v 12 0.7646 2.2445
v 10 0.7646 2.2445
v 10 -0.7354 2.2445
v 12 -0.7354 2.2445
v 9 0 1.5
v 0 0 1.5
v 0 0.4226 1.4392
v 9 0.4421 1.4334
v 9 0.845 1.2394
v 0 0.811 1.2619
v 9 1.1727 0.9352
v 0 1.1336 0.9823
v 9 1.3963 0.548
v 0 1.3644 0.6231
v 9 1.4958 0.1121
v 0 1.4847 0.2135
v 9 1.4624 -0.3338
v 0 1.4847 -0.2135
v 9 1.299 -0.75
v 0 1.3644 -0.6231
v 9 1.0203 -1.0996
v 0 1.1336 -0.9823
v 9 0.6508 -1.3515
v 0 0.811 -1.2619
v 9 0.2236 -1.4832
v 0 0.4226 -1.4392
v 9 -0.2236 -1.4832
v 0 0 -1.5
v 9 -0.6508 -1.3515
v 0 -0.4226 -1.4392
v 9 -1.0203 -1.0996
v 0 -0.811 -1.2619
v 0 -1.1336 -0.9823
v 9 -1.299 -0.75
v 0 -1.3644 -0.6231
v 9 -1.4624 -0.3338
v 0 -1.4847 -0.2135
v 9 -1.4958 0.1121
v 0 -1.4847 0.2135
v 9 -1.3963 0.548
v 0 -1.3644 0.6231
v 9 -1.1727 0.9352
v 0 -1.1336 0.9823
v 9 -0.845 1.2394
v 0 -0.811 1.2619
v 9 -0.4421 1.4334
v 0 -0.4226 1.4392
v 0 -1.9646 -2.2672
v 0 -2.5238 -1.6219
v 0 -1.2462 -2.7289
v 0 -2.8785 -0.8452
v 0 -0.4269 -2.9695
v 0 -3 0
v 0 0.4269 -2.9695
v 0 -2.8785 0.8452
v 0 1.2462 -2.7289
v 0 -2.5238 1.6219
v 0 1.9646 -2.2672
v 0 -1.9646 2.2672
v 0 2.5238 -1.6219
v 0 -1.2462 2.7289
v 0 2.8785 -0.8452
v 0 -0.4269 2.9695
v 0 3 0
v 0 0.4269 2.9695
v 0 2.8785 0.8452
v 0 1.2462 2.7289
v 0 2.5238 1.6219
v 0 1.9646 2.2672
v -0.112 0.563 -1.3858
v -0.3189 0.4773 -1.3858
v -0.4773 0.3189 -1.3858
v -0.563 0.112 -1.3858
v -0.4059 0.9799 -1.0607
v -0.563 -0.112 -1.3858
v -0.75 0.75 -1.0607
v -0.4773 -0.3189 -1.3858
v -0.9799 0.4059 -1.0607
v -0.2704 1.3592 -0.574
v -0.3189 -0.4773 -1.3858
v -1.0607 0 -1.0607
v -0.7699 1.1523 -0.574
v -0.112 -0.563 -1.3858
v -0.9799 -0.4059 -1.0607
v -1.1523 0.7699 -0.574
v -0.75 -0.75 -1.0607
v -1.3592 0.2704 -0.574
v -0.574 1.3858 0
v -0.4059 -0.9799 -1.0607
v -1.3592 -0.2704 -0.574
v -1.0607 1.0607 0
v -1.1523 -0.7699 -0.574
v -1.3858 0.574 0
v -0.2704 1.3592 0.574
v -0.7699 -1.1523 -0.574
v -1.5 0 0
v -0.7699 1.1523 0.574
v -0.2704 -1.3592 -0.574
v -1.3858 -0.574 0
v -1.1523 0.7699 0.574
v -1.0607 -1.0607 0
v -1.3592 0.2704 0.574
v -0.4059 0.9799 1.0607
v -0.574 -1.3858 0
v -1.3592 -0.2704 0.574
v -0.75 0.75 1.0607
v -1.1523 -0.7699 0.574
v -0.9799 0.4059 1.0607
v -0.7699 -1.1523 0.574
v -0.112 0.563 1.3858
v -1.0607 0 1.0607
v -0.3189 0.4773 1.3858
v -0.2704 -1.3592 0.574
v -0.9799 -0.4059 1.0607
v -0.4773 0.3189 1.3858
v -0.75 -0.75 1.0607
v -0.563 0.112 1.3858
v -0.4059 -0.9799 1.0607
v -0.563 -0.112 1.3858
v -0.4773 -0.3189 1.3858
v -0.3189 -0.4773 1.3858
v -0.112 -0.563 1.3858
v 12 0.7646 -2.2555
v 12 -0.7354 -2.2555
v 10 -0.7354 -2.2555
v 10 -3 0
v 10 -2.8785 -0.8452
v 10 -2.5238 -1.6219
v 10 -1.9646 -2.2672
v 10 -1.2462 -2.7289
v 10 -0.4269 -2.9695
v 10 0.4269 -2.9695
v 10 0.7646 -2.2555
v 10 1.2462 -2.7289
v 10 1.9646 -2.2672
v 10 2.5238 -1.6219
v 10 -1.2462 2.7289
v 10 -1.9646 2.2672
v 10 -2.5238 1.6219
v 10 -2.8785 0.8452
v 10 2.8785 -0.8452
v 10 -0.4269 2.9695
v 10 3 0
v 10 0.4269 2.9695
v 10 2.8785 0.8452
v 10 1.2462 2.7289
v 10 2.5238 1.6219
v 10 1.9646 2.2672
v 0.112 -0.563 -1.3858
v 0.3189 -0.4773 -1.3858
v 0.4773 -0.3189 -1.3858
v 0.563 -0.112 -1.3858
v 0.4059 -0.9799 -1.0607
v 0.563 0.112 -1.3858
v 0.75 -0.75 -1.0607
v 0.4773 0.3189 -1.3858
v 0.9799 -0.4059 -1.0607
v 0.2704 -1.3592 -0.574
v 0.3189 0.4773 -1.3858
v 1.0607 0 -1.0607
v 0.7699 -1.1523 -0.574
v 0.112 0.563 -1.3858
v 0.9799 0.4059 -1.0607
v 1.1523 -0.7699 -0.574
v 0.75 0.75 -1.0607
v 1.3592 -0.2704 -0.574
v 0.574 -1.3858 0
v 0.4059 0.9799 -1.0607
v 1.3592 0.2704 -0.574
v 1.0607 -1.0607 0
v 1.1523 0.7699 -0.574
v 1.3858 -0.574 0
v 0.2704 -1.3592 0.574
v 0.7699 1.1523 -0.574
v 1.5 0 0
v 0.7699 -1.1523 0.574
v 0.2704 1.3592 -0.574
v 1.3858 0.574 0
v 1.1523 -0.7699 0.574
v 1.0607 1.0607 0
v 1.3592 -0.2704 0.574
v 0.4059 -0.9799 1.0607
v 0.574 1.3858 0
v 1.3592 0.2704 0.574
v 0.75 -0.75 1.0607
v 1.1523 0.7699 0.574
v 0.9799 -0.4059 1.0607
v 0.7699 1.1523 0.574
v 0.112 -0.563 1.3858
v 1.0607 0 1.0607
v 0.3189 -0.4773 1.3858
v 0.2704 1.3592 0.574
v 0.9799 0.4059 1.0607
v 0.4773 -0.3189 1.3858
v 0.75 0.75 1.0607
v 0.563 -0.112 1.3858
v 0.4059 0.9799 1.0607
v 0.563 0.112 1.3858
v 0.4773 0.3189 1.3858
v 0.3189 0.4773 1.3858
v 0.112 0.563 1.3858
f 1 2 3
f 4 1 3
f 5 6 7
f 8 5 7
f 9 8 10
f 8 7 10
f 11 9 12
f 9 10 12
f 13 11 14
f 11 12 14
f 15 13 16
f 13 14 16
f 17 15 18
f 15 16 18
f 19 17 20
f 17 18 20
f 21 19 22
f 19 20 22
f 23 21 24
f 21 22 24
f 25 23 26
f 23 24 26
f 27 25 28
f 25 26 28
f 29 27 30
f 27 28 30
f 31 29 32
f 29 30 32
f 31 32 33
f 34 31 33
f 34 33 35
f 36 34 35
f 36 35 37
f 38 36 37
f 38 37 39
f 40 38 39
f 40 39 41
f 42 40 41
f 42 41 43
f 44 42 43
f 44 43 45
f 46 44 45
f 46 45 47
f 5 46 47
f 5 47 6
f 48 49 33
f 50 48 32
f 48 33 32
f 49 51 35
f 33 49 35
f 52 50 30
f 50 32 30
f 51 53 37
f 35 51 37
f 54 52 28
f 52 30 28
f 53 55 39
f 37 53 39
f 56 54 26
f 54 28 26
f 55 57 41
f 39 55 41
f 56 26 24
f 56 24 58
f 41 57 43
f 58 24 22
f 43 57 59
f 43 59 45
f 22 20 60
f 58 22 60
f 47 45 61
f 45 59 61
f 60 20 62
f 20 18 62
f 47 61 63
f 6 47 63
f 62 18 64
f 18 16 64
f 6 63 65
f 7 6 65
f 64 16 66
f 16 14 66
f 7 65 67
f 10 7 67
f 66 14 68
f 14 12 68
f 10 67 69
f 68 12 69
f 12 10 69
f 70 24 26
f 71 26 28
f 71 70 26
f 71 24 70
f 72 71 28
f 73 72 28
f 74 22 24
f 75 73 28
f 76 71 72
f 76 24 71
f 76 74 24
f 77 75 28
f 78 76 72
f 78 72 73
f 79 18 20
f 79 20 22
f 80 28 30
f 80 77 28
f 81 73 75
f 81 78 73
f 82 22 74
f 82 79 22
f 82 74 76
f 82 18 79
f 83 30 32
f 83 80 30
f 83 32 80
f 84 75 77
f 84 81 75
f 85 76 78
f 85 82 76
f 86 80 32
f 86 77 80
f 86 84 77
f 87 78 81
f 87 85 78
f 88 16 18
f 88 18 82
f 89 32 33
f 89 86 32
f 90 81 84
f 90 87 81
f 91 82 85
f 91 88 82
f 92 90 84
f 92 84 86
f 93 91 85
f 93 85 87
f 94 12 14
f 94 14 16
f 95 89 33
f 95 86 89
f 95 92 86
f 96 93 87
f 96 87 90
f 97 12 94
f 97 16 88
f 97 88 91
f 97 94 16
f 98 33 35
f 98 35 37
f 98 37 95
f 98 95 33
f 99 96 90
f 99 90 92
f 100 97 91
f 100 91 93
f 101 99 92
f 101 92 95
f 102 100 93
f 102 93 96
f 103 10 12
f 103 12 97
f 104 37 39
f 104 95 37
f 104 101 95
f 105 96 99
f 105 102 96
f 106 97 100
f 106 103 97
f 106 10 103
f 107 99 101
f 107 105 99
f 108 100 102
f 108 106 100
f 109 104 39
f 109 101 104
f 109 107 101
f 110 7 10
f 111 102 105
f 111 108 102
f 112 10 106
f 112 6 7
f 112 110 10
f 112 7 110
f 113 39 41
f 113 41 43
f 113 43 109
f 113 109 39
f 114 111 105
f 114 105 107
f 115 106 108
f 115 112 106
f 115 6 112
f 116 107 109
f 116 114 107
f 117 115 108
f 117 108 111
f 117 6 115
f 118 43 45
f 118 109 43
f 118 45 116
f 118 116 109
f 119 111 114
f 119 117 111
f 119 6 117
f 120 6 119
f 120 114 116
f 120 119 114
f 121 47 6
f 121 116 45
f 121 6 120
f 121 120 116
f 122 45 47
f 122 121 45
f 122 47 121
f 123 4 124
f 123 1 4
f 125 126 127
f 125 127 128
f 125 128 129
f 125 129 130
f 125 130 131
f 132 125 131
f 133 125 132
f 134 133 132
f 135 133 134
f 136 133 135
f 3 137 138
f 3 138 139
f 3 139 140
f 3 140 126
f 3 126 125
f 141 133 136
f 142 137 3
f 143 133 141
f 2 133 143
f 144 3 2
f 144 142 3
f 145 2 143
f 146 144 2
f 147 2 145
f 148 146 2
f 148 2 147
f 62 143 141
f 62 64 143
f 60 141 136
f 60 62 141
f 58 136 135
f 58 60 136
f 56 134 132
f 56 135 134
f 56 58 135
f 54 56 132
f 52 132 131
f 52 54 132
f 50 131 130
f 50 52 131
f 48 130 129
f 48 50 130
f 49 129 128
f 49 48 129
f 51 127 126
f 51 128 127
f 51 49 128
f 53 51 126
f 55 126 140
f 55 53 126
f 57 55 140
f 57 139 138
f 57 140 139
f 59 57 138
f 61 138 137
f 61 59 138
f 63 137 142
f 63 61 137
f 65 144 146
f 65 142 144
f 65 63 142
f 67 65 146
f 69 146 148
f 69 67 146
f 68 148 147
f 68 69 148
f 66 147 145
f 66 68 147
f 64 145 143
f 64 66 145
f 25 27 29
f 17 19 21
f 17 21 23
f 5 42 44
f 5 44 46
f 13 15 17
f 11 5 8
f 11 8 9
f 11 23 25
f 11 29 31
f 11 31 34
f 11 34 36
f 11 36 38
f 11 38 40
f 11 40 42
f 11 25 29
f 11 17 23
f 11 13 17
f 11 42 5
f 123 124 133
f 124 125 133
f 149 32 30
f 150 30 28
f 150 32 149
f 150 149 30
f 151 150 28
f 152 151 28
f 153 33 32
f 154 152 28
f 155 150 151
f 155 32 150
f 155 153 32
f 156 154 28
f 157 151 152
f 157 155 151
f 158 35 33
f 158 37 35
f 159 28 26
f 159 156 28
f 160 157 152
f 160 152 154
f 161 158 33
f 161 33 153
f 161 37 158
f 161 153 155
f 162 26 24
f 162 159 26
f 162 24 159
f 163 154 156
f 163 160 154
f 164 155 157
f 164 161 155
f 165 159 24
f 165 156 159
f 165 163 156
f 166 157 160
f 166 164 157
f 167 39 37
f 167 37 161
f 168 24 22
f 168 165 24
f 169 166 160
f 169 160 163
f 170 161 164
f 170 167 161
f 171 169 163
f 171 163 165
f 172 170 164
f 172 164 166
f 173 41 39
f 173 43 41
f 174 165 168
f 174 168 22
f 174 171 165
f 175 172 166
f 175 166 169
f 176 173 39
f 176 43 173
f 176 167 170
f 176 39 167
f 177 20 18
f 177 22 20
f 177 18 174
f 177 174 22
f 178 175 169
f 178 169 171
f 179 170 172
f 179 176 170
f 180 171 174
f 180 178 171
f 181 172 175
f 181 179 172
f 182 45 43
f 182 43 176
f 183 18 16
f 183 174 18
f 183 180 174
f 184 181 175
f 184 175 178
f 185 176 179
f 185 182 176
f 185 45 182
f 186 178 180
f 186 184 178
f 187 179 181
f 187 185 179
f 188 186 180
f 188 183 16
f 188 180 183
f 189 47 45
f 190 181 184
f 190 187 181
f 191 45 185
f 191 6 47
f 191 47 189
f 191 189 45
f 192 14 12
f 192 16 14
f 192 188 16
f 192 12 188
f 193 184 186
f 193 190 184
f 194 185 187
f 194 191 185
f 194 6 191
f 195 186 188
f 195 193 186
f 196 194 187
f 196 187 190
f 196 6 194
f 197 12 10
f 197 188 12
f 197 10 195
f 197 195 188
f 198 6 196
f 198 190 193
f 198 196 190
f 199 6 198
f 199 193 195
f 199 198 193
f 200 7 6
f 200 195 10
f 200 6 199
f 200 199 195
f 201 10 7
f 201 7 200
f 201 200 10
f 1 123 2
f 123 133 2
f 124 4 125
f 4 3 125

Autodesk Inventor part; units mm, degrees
ref_plane "YZ Plane" through (0, 0, 0) normal (1, 0, 0) x (0, 1, 0)
ref_plane "XZ Plane" through (0, 0, 0) normal (0, 1, 0) x (-1, 0, 0)
ref_plane "XY Plane" through (0, 0, 0) normal (0, 0, 1) x (1, 0, 0)
sketch "스케치1" plane through (0, 0, 0) normal (1, 0, 0) x (0, 1, 0)
  circle A0 centre (0, 0) radius 3
  dimension "d0" = 6
extrude "돌출1" add sketch "스케치1" along normal blind 10
sketch "스케치2" plane through (0, 0, 0) normal (-1, 0, 0) x (0, 0, 1)
  circle A0 centre (0, 0) radius 1.5
  dimension "d3" = 3
extrude "돌출2" cut sketch "스케치2" against normal blind 9
sketch "스케치4" plane through (0, 0, 0) normal (-1, 0, 0) x (0, 0, 1)
  arc A0 (-1.5, 0) -> (1.5, 0) centre (0, 0) ccw
  line L0 (-1.5, 0) -> (1.5, 0)
  line L1 (-2.0992, 0) -> (3.7582, 0)
revolve "회전1" add sketch "스케치4" angle 360 about axis through (0, 0, -2.0992) along (0, 0, 1)
sketch "스케치5" plane through (10, 0, 0) normal (1, 0, 0) x (0, 0, -1)
  line L0 (2.2555, 0.7646) -> (-2.2445, 0.7646)
  line L1 (-2.2445, 0.7646) -> (-2.2445, -0.7354)
  line L2 (-2.2445, -0.7354) -> (2.2555, -0.7354)
  line L3 (2.2555, -0.7354) -> (2.2555, 0.7646)
  point P0 (0, 0)
  dimension "d8" = 4.5
  dimension "d9" = 1.5
extrude "돌출3" add sketch "스케치5" along normal blind 2
properties part number "레이져"
